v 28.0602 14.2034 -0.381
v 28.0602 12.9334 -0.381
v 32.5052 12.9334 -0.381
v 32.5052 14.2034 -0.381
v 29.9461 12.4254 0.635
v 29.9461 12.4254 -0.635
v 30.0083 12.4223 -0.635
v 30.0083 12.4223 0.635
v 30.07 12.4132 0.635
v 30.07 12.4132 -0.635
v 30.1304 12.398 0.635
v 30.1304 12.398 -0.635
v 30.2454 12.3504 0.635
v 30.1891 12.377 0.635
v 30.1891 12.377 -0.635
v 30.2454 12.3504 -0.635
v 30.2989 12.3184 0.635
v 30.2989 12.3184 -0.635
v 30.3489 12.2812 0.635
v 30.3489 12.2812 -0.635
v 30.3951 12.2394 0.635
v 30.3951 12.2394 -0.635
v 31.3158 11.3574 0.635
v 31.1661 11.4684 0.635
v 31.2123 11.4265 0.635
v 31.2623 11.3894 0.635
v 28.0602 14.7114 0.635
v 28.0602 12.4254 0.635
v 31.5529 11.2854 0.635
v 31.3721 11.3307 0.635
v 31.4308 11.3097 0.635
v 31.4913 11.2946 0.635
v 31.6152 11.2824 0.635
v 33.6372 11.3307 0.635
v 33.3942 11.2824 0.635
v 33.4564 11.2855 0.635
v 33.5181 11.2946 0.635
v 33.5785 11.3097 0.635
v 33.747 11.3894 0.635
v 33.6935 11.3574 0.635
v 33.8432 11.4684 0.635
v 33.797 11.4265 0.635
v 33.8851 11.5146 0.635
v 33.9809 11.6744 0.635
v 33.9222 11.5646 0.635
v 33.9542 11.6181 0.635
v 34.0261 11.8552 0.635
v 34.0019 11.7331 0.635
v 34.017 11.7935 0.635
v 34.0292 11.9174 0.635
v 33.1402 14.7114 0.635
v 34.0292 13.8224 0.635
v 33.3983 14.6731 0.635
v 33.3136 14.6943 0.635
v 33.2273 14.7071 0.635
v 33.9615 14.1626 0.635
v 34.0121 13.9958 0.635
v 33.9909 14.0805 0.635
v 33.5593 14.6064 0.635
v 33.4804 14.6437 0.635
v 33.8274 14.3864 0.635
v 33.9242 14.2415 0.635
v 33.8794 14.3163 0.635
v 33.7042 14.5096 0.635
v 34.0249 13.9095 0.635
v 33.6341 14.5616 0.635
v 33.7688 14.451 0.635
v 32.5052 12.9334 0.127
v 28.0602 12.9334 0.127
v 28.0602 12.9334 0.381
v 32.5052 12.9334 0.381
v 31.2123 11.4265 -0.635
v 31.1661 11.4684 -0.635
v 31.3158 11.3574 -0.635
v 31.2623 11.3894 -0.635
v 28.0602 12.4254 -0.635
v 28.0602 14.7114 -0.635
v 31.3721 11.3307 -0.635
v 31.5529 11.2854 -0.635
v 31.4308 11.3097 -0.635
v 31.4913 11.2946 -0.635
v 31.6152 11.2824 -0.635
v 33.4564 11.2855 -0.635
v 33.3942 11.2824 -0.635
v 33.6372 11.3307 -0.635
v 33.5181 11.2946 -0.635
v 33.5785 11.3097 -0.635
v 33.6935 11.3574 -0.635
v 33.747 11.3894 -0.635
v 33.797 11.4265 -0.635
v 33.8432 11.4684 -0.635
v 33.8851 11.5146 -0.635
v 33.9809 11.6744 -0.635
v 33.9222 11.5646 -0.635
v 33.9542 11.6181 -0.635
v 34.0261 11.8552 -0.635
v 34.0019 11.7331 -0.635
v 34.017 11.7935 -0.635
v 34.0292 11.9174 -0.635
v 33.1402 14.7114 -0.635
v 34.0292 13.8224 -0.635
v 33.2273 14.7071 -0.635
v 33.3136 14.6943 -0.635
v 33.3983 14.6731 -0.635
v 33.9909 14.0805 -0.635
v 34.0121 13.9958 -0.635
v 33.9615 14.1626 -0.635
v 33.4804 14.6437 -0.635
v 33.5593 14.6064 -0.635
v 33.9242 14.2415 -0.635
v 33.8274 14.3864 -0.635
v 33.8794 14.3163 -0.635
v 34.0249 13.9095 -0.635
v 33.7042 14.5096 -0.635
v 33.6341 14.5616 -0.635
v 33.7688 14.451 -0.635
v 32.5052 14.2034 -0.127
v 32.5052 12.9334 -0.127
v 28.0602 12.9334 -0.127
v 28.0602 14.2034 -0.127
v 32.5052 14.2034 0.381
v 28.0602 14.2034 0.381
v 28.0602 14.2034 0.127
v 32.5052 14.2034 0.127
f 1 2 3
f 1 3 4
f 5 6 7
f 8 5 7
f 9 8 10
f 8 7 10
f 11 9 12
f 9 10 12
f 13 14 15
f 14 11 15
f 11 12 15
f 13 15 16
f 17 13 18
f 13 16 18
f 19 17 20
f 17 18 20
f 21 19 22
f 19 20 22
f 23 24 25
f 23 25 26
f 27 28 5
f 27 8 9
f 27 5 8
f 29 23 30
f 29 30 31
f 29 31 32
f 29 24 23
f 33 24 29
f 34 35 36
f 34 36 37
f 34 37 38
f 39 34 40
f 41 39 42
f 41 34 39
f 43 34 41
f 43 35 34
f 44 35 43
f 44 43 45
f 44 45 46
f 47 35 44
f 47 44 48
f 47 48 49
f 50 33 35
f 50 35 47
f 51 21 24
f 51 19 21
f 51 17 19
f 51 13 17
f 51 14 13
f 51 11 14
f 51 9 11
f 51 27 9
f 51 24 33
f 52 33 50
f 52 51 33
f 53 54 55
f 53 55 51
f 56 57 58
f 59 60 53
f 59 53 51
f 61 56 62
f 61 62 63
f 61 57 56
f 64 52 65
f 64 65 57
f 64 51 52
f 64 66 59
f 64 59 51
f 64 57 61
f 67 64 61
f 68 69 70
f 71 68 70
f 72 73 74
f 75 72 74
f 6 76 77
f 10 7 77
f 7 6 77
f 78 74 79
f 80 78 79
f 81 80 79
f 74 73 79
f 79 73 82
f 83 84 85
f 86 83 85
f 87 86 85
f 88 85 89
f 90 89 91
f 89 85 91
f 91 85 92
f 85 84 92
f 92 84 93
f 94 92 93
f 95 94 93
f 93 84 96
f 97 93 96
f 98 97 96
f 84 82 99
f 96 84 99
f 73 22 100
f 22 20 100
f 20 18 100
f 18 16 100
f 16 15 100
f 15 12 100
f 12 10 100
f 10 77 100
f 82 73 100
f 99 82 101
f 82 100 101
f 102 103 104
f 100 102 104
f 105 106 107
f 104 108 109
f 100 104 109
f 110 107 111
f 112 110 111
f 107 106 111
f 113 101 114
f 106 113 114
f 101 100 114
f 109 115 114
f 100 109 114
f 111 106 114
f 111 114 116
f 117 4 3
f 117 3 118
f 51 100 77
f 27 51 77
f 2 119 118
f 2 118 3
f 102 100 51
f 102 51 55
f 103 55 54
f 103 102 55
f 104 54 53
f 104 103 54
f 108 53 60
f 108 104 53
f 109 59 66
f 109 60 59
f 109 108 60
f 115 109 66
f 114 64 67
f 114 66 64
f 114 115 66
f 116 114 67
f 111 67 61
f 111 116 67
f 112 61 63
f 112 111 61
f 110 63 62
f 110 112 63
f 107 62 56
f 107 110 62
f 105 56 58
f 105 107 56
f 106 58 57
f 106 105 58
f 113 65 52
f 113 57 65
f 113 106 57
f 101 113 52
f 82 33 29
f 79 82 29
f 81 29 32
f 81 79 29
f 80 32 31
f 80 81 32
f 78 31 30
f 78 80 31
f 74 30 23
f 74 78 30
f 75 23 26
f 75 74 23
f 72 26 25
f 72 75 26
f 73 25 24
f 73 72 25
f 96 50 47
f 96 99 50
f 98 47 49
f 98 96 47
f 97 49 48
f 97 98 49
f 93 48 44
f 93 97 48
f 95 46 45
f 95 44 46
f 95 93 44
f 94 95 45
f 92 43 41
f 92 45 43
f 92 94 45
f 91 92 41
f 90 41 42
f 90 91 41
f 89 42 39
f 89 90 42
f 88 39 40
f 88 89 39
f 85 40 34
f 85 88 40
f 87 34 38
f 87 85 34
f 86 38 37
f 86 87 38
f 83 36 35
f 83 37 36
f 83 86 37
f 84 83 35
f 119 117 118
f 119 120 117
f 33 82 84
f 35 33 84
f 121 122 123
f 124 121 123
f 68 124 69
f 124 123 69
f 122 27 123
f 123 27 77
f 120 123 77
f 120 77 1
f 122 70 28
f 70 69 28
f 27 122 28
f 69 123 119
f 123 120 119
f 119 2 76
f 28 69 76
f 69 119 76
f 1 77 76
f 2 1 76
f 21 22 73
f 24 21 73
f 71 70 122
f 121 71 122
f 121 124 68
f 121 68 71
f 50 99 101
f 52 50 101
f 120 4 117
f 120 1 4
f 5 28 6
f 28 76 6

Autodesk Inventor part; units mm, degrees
ref_plane "YZ Plane" through (0, 0, 0) normal (1, 0, 0) x (0, 1, 0)
ref_plane "XZ Plane" through (0, 0, 0) normal (0, 1, 0) x (-1, 0, 0)
ref_plane "XY Plane" through (0, 0, 0) normal (0, 0, 1) x (1, 0, 0)
sketch "Sketch1" plane through (0, 0, 0) normal (0, 0, 1) x (1, 0, 0)
  line L0 (28.0602, 14.7114) -> (28.0602, 12.4254)
  line L1 (28.0602, 12.4254) -> (29.9461, 12.4254)
  line L2 (30.3951, 12.2394) -> (31.1661, 11.4684)
  line L3 (31.6152, 11.2824) -> (33.3942, 11.2824)
  line L4 (34.0292, 11.9174) -> (34.0292, 13.8224)
  line L5 (33.1402, 14.7114) -> (28.0602, 14.7114)
  arc A0 (34.0292, 13.8224) -> (33.1402, 14.7114) centre (33.1402, 13.8224) ccw
  arc A1 (33.3942, 11.2824) -> (34.0292, 11.9174) centre (33.3942, 11.9174) ccw
  arc A2 (31.1661, 11.4684) -> (31.6152, 11.2824) centre (31.6152, 11.9174) ccw
  arc A3 (30.3951, 12.2394) -> (29.9461, 12.4254) centre (29.9461, 11.7904) ccw
  point P0 (0, 0)
  dimension "d0" = 135
  dimension "d1" = 0.889
  dimension "d2" = 0.635
  dimension "d5" = 5.08
  dimension "d6" = 2.286
  dimension "d7" = 1.886
  dimension "d8" = 1.905
extrude "Extrusion1" add sketch "Sketch1" along normal mid plane 1.27
sketch "Sketch2" plane through (28.0602, 12.4254, -0.635) normal (-1, 0, 0) x (0, 0, 1)
  point P0 (0.635, -12.4254)
sketch "Sketch3" plane through (28.0602, 12.4254, 0.635) normal (-1, 0, 0) x (0, 0, 1)
  line L0 (-1.016, 1.778) -> (-0.762, 1.778)
  line L1 (-0.762, 1.778) -> (-0.762, 0.508)
  line L2 (-0.762, 0.508) -> (-1.016, 0.508)
  line L3 (-1.016, 0.508) -> (-1.016, 1.778)
  line L4 (-1.016, 1.778) -> (-0.762, 0.508) construction
  line L5 (-0.762, 1.778) -> (-1.016, 0.508) construction
  line L6 (-0.635, 2.4021) -> (-0.635, -0.4508)
  line L7 (-1.27, -0.186) -> (0, -0.186) projected
  line L8 (0, 2.286) -> (0, 0) projected
  line L9 (0, 1.143) -> (-1.4315, 1.143)
  line L10 (-0.254, 1.778) -> (-0.508, 1.778)
  line L11 (-0.508, 1.778) -> (-0.508, 0.508)
  line L12 (-0.508, 0.508) -> (-0.254, 0.508)
  line L13 (-0.254, 0.508) -> (-0.254, 1.778)
  line L14 (-0.254, 1.778) -> (-0.508, 0.508) construction
  line L15 (-0.508, 1.778) -> (-0.254, 0.508) construction
  point P0 (-0.635, -12.4254)
  point P1 (-0.889, 1.143)
  point P2 (-0.889, 1.143)
  point P3 (-0.381, 1.143)
  point P4 (-0.381, 1.143)
  dimension "d9" = 0.254
  dimension "d10" = 0.254
  dimension "d11" = 1.27
extrude "Extrusion2" cut sketch "Sketch3" against normal blind 4.445
properties part number "gLOW_rED" material "ABS Plastic"
